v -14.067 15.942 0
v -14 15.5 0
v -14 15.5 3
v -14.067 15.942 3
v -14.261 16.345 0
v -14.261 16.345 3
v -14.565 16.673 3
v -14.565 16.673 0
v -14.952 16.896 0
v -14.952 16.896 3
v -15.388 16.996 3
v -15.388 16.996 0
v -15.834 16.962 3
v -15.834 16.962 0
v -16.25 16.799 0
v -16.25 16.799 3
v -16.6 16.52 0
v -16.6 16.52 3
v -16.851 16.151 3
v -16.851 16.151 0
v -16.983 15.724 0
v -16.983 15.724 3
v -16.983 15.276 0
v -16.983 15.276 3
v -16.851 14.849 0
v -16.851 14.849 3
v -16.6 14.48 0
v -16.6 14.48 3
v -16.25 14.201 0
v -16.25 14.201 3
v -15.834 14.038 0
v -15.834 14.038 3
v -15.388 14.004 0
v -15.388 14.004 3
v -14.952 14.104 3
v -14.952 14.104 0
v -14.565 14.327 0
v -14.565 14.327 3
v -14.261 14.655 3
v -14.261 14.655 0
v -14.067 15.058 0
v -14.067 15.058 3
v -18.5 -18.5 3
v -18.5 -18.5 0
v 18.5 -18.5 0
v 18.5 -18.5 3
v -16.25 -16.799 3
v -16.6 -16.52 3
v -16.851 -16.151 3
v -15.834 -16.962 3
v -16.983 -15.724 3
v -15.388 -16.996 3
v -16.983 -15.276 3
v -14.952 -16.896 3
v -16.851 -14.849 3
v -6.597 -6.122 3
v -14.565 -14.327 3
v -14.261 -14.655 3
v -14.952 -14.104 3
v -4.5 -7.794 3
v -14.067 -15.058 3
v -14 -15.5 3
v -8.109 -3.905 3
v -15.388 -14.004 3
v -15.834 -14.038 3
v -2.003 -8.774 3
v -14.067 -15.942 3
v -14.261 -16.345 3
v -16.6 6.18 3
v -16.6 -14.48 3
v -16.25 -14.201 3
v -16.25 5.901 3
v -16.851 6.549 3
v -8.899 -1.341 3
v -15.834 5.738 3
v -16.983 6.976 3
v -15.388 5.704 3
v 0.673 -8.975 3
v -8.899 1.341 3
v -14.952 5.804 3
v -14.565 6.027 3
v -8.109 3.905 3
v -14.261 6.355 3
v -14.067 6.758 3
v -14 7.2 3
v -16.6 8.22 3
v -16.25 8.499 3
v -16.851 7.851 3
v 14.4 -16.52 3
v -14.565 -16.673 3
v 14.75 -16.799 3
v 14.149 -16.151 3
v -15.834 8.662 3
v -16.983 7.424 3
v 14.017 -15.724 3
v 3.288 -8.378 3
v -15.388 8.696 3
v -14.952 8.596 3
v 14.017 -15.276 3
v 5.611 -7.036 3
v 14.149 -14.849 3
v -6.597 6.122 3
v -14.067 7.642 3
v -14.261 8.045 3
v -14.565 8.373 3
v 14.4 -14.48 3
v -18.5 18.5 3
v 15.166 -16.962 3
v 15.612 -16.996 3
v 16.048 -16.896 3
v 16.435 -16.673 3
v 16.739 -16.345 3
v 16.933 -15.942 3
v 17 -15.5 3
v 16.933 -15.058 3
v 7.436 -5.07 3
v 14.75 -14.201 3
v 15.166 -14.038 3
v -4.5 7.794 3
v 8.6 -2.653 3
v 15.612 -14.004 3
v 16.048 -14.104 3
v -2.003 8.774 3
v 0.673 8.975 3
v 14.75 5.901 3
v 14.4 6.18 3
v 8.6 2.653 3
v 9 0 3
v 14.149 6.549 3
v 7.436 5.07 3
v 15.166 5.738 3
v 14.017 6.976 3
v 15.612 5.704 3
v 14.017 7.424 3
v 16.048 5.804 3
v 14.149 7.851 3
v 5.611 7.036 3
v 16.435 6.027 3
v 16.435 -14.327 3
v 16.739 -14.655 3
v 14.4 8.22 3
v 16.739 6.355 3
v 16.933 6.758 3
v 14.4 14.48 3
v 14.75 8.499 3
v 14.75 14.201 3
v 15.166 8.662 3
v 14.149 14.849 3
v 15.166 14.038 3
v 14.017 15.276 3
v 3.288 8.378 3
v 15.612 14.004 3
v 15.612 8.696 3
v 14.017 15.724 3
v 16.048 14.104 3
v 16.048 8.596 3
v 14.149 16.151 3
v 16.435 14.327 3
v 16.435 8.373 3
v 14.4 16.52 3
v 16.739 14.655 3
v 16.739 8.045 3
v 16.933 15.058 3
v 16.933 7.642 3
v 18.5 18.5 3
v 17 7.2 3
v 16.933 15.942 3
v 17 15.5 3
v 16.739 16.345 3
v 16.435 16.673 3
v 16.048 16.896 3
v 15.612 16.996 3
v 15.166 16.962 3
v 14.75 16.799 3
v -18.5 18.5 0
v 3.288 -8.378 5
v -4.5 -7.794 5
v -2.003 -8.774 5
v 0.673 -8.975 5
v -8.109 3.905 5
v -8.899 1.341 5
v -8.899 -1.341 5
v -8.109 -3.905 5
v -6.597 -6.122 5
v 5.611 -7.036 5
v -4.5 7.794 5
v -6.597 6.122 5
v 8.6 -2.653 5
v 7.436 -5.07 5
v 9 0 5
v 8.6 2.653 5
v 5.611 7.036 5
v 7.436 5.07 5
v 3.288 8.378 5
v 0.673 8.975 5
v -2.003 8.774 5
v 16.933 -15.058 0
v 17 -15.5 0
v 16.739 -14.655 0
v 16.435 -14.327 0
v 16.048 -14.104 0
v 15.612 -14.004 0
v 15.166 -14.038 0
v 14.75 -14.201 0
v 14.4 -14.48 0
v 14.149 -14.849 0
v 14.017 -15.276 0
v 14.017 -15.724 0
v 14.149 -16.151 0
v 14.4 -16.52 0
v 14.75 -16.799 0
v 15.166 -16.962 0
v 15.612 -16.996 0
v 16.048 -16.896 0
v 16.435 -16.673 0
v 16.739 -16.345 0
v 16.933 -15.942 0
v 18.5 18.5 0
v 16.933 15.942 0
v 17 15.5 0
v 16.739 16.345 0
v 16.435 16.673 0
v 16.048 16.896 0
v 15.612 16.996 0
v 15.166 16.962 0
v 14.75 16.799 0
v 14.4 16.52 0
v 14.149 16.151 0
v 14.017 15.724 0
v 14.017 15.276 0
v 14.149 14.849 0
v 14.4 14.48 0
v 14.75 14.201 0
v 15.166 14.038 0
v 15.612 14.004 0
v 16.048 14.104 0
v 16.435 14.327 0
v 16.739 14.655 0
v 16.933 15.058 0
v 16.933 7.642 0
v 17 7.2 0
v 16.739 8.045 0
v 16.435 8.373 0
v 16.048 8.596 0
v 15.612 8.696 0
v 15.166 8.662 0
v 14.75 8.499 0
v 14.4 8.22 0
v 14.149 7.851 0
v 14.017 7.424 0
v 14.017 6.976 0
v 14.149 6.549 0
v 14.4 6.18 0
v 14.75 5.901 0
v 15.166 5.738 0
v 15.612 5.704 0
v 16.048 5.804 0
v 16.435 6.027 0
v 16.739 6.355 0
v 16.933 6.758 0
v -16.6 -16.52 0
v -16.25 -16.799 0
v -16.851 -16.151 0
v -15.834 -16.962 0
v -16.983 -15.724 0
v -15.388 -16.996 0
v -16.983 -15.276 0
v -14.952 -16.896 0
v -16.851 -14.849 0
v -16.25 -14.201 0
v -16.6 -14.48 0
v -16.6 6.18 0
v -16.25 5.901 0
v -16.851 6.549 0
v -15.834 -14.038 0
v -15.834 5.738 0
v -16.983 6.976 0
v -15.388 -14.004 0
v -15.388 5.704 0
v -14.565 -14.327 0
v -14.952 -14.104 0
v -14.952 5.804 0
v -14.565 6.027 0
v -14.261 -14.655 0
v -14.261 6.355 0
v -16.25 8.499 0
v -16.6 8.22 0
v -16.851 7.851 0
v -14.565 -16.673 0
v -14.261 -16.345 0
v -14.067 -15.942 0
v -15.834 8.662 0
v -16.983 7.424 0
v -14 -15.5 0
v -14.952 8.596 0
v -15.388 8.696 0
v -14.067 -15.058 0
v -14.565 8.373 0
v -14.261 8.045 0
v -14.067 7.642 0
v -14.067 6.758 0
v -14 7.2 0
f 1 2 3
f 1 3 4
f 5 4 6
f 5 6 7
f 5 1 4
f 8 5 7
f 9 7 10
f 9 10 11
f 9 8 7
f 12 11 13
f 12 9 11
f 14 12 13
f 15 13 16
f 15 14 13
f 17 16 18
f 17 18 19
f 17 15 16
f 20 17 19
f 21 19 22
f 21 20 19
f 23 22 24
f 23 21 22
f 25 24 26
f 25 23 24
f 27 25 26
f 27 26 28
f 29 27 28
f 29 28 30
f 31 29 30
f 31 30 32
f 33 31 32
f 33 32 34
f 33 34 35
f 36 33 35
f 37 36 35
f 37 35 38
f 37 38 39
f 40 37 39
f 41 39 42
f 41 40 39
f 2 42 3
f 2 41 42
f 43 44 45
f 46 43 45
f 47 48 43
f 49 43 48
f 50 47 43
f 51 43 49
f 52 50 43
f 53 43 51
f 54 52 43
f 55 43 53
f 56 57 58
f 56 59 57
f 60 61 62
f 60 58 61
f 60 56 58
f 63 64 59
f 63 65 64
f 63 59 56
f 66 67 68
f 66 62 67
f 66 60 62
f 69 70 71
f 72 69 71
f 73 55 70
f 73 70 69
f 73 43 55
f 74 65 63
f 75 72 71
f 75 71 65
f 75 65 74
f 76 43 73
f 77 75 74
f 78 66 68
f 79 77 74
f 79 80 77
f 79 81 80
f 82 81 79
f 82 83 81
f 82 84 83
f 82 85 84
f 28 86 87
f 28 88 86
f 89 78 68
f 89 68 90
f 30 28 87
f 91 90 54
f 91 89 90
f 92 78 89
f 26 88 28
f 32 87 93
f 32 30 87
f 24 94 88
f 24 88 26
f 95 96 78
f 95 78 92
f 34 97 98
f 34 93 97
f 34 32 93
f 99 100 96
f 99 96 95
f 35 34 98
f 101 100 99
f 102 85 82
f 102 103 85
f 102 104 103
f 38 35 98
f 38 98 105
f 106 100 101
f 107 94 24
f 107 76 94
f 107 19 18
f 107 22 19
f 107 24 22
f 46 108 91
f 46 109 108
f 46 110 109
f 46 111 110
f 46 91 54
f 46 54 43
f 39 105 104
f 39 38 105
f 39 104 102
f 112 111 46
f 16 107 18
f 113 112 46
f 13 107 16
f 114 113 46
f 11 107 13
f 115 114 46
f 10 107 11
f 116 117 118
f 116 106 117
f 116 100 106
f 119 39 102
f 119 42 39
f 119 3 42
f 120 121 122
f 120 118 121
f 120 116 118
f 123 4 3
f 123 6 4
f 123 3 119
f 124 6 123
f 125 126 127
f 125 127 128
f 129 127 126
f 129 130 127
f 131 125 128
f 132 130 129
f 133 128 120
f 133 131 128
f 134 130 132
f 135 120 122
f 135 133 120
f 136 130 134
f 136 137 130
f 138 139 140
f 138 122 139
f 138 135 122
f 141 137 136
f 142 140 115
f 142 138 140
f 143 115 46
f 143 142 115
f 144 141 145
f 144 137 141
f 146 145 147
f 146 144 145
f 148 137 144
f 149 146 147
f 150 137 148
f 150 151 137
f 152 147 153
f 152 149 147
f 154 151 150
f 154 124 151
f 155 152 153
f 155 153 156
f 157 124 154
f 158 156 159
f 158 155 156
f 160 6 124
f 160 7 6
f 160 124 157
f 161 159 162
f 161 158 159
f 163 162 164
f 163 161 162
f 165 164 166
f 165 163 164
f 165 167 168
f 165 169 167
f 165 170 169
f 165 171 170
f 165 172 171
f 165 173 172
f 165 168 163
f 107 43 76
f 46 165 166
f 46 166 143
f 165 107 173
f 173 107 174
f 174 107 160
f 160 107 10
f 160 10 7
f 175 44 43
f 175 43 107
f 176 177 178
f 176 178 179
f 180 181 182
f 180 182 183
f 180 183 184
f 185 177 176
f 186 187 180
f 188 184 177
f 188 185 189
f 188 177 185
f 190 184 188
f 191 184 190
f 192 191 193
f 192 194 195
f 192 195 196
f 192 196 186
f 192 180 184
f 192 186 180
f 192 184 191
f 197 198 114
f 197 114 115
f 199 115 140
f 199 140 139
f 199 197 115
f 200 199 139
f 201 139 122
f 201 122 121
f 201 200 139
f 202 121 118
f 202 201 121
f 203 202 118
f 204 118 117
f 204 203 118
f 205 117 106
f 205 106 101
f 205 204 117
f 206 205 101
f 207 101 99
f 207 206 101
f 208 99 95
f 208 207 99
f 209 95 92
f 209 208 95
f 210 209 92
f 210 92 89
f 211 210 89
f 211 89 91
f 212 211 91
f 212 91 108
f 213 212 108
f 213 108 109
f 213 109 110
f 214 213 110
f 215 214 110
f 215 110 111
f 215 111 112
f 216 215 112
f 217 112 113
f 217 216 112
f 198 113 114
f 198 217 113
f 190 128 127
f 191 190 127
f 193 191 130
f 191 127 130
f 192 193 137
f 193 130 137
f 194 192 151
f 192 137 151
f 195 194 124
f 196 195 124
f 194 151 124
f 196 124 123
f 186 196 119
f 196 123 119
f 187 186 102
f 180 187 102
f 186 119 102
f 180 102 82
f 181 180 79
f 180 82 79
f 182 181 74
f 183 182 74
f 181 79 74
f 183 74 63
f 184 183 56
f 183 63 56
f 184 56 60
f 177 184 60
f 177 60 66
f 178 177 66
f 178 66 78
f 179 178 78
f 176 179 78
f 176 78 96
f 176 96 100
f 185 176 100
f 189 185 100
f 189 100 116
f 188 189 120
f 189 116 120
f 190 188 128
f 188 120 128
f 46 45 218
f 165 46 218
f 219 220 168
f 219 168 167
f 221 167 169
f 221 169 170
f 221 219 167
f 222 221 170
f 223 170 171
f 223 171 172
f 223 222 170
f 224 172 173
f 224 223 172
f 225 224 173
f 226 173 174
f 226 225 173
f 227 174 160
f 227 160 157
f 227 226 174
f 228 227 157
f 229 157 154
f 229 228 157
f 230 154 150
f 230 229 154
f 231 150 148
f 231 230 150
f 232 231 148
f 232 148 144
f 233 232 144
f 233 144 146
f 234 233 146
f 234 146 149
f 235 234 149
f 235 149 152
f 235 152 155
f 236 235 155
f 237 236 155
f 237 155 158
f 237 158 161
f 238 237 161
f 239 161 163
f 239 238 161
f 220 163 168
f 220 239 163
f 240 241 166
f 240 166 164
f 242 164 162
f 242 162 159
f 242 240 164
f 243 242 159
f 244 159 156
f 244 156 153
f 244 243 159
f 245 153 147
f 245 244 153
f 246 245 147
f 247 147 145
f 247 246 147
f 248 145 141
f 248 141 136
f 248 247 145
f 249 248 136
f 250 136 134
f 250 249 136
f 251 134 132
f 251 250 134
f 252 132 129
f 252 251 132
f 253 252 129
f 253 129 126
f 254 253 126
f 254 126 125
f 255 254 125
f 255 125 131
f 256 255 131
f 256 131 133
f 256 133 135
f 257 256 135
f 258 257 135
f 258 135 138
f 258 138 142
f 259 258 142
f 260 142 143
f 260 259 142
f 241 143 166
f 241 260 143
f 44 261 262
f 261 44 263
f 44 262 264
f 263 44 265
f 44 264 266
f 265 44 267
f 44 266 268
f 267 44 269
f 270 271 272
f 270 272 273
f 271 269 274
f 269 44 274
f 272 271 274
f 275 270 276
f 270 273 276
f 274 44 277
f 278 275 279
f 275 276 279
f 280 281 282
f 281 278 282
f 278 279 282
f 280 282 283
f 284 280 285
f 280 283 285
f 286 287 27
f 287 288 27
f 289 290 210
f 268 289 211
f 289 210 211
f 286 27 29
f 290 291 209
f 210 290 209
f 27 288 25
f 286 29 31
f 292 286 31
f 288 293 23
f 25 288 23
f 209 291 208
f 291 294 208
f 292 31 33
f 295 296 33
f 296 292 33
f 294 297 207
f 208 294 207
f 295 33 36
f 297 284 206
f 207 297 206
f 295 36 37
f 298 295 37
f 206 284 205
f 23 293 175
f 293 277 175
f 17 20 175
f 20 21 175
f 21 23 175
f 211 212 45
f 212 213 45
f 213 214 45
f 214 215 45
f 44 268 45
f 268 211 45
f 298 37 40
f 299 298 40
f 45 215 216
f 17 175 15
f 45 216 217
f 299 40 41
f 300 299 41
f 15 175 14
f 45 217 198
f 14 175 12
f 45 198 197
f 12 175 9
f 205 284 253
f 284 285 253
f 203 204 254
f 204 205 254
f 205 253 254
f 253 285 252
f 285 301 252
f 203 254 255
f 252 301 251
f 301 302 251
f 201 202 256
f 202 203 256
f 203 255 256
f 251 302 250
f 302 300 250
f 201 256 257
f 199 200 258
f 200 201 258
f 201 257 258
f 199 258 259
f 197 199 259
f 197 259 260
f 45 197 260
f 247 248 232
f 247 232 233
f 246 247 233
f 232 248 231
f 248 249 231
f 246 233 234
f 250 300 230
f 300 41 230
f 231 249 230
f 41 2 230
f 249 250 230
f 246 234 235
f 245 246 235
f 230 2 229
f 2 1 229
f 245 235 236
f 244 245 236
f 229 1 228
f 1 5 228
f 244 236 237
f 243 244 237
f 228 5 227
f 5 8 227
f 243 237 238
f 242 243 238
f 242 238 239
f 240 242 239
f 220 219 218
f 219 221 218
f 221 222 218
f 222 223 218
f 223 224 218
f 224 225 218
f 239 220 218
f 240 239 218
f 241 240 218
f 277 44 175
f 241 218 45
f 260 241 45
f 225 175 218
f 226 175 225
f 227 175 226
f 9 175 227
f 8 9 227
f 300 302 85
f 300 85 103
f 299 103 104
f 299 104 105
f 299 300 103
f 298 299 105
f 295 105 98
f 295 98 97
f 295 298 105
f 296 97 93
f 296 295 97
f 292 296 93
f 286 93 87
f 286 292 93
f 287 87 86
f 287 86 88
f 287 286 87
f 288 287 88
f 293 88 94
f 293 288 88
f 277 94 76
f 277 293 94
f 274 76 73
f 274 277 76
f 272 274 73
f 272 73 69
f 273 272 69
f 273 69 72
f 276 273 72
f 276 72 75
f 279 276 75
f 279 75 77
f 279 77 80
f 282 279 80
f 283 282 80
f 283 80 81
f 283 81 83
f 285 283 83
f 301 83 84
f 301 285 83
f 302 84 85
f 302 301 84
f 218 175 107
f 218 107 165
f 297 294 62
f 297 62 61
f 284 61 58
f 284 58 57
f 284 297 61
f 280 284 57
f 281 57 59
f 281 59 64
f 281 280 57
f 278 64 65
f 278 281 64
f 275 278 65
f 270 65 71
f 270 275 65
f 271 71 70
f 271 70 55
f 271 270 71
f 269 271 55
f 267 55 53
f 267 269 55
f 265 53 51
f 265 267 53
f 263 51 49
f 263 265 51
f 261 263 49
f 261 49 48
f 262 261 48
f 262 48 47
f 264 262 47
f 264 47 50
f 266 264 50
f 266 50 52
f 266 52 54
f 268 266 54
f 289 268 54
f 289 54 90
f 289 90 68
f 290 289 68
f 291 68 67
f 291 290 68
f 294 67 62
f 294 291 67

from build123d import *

# Parameters (mm, degrees)
SKETCH1_W           = 37
SKETCH1_H           = 37
SKETCH1_R           = 1.5
BOSS_EXTRUDE1_DEPTH = 3
SKETCH2_R           = 9
BOSS_EXTRUDE2_DEPTH = 2


with BuildPart() as part:
    # Sketch1 → Boss-Extrude1 (new body)
    with BuildSketch(Plane.XY):
        Rectangle(SKETCH1_W, SKETCH1_H)
        with Locations((15.5, 7.2)):
            Circle(SKETCH1_R, mode=Mode.SUBTRACT)
        with Locations((-15.5, 7.2)):
            Circle(SKETCH1_R, mode=Mode.SUBTRACT)
        with Locations((-15.5, 15.5)):
            Circle(SKETCH1_R, mode=Mode.SUBTRACT)
        with Locations((15.5, 15.5)):
            Circle(SKETCH1_R, mode=Mode.SUBTRACT)
        with Locations((15.5, -15.5)):
            Circle(SKETCH1_R, mode=Mode.SUBTRACT)
        with Locations((-15.5, -15.5)):
            Circle(SKETCH1_R, mode=Mode.SUBTRACT)
    extrude(amount=BOSS_EXTRUDE1_DEPTH)

    # Sketch2 → Boss-Extrude2 (add)
    with BuildSketch(Plane.XY.offset(3)):
        Circle(SKETCH2_R)
    extrude(amount=BOSS_EXTRUDE2_DEPTH)


solid = part.part
